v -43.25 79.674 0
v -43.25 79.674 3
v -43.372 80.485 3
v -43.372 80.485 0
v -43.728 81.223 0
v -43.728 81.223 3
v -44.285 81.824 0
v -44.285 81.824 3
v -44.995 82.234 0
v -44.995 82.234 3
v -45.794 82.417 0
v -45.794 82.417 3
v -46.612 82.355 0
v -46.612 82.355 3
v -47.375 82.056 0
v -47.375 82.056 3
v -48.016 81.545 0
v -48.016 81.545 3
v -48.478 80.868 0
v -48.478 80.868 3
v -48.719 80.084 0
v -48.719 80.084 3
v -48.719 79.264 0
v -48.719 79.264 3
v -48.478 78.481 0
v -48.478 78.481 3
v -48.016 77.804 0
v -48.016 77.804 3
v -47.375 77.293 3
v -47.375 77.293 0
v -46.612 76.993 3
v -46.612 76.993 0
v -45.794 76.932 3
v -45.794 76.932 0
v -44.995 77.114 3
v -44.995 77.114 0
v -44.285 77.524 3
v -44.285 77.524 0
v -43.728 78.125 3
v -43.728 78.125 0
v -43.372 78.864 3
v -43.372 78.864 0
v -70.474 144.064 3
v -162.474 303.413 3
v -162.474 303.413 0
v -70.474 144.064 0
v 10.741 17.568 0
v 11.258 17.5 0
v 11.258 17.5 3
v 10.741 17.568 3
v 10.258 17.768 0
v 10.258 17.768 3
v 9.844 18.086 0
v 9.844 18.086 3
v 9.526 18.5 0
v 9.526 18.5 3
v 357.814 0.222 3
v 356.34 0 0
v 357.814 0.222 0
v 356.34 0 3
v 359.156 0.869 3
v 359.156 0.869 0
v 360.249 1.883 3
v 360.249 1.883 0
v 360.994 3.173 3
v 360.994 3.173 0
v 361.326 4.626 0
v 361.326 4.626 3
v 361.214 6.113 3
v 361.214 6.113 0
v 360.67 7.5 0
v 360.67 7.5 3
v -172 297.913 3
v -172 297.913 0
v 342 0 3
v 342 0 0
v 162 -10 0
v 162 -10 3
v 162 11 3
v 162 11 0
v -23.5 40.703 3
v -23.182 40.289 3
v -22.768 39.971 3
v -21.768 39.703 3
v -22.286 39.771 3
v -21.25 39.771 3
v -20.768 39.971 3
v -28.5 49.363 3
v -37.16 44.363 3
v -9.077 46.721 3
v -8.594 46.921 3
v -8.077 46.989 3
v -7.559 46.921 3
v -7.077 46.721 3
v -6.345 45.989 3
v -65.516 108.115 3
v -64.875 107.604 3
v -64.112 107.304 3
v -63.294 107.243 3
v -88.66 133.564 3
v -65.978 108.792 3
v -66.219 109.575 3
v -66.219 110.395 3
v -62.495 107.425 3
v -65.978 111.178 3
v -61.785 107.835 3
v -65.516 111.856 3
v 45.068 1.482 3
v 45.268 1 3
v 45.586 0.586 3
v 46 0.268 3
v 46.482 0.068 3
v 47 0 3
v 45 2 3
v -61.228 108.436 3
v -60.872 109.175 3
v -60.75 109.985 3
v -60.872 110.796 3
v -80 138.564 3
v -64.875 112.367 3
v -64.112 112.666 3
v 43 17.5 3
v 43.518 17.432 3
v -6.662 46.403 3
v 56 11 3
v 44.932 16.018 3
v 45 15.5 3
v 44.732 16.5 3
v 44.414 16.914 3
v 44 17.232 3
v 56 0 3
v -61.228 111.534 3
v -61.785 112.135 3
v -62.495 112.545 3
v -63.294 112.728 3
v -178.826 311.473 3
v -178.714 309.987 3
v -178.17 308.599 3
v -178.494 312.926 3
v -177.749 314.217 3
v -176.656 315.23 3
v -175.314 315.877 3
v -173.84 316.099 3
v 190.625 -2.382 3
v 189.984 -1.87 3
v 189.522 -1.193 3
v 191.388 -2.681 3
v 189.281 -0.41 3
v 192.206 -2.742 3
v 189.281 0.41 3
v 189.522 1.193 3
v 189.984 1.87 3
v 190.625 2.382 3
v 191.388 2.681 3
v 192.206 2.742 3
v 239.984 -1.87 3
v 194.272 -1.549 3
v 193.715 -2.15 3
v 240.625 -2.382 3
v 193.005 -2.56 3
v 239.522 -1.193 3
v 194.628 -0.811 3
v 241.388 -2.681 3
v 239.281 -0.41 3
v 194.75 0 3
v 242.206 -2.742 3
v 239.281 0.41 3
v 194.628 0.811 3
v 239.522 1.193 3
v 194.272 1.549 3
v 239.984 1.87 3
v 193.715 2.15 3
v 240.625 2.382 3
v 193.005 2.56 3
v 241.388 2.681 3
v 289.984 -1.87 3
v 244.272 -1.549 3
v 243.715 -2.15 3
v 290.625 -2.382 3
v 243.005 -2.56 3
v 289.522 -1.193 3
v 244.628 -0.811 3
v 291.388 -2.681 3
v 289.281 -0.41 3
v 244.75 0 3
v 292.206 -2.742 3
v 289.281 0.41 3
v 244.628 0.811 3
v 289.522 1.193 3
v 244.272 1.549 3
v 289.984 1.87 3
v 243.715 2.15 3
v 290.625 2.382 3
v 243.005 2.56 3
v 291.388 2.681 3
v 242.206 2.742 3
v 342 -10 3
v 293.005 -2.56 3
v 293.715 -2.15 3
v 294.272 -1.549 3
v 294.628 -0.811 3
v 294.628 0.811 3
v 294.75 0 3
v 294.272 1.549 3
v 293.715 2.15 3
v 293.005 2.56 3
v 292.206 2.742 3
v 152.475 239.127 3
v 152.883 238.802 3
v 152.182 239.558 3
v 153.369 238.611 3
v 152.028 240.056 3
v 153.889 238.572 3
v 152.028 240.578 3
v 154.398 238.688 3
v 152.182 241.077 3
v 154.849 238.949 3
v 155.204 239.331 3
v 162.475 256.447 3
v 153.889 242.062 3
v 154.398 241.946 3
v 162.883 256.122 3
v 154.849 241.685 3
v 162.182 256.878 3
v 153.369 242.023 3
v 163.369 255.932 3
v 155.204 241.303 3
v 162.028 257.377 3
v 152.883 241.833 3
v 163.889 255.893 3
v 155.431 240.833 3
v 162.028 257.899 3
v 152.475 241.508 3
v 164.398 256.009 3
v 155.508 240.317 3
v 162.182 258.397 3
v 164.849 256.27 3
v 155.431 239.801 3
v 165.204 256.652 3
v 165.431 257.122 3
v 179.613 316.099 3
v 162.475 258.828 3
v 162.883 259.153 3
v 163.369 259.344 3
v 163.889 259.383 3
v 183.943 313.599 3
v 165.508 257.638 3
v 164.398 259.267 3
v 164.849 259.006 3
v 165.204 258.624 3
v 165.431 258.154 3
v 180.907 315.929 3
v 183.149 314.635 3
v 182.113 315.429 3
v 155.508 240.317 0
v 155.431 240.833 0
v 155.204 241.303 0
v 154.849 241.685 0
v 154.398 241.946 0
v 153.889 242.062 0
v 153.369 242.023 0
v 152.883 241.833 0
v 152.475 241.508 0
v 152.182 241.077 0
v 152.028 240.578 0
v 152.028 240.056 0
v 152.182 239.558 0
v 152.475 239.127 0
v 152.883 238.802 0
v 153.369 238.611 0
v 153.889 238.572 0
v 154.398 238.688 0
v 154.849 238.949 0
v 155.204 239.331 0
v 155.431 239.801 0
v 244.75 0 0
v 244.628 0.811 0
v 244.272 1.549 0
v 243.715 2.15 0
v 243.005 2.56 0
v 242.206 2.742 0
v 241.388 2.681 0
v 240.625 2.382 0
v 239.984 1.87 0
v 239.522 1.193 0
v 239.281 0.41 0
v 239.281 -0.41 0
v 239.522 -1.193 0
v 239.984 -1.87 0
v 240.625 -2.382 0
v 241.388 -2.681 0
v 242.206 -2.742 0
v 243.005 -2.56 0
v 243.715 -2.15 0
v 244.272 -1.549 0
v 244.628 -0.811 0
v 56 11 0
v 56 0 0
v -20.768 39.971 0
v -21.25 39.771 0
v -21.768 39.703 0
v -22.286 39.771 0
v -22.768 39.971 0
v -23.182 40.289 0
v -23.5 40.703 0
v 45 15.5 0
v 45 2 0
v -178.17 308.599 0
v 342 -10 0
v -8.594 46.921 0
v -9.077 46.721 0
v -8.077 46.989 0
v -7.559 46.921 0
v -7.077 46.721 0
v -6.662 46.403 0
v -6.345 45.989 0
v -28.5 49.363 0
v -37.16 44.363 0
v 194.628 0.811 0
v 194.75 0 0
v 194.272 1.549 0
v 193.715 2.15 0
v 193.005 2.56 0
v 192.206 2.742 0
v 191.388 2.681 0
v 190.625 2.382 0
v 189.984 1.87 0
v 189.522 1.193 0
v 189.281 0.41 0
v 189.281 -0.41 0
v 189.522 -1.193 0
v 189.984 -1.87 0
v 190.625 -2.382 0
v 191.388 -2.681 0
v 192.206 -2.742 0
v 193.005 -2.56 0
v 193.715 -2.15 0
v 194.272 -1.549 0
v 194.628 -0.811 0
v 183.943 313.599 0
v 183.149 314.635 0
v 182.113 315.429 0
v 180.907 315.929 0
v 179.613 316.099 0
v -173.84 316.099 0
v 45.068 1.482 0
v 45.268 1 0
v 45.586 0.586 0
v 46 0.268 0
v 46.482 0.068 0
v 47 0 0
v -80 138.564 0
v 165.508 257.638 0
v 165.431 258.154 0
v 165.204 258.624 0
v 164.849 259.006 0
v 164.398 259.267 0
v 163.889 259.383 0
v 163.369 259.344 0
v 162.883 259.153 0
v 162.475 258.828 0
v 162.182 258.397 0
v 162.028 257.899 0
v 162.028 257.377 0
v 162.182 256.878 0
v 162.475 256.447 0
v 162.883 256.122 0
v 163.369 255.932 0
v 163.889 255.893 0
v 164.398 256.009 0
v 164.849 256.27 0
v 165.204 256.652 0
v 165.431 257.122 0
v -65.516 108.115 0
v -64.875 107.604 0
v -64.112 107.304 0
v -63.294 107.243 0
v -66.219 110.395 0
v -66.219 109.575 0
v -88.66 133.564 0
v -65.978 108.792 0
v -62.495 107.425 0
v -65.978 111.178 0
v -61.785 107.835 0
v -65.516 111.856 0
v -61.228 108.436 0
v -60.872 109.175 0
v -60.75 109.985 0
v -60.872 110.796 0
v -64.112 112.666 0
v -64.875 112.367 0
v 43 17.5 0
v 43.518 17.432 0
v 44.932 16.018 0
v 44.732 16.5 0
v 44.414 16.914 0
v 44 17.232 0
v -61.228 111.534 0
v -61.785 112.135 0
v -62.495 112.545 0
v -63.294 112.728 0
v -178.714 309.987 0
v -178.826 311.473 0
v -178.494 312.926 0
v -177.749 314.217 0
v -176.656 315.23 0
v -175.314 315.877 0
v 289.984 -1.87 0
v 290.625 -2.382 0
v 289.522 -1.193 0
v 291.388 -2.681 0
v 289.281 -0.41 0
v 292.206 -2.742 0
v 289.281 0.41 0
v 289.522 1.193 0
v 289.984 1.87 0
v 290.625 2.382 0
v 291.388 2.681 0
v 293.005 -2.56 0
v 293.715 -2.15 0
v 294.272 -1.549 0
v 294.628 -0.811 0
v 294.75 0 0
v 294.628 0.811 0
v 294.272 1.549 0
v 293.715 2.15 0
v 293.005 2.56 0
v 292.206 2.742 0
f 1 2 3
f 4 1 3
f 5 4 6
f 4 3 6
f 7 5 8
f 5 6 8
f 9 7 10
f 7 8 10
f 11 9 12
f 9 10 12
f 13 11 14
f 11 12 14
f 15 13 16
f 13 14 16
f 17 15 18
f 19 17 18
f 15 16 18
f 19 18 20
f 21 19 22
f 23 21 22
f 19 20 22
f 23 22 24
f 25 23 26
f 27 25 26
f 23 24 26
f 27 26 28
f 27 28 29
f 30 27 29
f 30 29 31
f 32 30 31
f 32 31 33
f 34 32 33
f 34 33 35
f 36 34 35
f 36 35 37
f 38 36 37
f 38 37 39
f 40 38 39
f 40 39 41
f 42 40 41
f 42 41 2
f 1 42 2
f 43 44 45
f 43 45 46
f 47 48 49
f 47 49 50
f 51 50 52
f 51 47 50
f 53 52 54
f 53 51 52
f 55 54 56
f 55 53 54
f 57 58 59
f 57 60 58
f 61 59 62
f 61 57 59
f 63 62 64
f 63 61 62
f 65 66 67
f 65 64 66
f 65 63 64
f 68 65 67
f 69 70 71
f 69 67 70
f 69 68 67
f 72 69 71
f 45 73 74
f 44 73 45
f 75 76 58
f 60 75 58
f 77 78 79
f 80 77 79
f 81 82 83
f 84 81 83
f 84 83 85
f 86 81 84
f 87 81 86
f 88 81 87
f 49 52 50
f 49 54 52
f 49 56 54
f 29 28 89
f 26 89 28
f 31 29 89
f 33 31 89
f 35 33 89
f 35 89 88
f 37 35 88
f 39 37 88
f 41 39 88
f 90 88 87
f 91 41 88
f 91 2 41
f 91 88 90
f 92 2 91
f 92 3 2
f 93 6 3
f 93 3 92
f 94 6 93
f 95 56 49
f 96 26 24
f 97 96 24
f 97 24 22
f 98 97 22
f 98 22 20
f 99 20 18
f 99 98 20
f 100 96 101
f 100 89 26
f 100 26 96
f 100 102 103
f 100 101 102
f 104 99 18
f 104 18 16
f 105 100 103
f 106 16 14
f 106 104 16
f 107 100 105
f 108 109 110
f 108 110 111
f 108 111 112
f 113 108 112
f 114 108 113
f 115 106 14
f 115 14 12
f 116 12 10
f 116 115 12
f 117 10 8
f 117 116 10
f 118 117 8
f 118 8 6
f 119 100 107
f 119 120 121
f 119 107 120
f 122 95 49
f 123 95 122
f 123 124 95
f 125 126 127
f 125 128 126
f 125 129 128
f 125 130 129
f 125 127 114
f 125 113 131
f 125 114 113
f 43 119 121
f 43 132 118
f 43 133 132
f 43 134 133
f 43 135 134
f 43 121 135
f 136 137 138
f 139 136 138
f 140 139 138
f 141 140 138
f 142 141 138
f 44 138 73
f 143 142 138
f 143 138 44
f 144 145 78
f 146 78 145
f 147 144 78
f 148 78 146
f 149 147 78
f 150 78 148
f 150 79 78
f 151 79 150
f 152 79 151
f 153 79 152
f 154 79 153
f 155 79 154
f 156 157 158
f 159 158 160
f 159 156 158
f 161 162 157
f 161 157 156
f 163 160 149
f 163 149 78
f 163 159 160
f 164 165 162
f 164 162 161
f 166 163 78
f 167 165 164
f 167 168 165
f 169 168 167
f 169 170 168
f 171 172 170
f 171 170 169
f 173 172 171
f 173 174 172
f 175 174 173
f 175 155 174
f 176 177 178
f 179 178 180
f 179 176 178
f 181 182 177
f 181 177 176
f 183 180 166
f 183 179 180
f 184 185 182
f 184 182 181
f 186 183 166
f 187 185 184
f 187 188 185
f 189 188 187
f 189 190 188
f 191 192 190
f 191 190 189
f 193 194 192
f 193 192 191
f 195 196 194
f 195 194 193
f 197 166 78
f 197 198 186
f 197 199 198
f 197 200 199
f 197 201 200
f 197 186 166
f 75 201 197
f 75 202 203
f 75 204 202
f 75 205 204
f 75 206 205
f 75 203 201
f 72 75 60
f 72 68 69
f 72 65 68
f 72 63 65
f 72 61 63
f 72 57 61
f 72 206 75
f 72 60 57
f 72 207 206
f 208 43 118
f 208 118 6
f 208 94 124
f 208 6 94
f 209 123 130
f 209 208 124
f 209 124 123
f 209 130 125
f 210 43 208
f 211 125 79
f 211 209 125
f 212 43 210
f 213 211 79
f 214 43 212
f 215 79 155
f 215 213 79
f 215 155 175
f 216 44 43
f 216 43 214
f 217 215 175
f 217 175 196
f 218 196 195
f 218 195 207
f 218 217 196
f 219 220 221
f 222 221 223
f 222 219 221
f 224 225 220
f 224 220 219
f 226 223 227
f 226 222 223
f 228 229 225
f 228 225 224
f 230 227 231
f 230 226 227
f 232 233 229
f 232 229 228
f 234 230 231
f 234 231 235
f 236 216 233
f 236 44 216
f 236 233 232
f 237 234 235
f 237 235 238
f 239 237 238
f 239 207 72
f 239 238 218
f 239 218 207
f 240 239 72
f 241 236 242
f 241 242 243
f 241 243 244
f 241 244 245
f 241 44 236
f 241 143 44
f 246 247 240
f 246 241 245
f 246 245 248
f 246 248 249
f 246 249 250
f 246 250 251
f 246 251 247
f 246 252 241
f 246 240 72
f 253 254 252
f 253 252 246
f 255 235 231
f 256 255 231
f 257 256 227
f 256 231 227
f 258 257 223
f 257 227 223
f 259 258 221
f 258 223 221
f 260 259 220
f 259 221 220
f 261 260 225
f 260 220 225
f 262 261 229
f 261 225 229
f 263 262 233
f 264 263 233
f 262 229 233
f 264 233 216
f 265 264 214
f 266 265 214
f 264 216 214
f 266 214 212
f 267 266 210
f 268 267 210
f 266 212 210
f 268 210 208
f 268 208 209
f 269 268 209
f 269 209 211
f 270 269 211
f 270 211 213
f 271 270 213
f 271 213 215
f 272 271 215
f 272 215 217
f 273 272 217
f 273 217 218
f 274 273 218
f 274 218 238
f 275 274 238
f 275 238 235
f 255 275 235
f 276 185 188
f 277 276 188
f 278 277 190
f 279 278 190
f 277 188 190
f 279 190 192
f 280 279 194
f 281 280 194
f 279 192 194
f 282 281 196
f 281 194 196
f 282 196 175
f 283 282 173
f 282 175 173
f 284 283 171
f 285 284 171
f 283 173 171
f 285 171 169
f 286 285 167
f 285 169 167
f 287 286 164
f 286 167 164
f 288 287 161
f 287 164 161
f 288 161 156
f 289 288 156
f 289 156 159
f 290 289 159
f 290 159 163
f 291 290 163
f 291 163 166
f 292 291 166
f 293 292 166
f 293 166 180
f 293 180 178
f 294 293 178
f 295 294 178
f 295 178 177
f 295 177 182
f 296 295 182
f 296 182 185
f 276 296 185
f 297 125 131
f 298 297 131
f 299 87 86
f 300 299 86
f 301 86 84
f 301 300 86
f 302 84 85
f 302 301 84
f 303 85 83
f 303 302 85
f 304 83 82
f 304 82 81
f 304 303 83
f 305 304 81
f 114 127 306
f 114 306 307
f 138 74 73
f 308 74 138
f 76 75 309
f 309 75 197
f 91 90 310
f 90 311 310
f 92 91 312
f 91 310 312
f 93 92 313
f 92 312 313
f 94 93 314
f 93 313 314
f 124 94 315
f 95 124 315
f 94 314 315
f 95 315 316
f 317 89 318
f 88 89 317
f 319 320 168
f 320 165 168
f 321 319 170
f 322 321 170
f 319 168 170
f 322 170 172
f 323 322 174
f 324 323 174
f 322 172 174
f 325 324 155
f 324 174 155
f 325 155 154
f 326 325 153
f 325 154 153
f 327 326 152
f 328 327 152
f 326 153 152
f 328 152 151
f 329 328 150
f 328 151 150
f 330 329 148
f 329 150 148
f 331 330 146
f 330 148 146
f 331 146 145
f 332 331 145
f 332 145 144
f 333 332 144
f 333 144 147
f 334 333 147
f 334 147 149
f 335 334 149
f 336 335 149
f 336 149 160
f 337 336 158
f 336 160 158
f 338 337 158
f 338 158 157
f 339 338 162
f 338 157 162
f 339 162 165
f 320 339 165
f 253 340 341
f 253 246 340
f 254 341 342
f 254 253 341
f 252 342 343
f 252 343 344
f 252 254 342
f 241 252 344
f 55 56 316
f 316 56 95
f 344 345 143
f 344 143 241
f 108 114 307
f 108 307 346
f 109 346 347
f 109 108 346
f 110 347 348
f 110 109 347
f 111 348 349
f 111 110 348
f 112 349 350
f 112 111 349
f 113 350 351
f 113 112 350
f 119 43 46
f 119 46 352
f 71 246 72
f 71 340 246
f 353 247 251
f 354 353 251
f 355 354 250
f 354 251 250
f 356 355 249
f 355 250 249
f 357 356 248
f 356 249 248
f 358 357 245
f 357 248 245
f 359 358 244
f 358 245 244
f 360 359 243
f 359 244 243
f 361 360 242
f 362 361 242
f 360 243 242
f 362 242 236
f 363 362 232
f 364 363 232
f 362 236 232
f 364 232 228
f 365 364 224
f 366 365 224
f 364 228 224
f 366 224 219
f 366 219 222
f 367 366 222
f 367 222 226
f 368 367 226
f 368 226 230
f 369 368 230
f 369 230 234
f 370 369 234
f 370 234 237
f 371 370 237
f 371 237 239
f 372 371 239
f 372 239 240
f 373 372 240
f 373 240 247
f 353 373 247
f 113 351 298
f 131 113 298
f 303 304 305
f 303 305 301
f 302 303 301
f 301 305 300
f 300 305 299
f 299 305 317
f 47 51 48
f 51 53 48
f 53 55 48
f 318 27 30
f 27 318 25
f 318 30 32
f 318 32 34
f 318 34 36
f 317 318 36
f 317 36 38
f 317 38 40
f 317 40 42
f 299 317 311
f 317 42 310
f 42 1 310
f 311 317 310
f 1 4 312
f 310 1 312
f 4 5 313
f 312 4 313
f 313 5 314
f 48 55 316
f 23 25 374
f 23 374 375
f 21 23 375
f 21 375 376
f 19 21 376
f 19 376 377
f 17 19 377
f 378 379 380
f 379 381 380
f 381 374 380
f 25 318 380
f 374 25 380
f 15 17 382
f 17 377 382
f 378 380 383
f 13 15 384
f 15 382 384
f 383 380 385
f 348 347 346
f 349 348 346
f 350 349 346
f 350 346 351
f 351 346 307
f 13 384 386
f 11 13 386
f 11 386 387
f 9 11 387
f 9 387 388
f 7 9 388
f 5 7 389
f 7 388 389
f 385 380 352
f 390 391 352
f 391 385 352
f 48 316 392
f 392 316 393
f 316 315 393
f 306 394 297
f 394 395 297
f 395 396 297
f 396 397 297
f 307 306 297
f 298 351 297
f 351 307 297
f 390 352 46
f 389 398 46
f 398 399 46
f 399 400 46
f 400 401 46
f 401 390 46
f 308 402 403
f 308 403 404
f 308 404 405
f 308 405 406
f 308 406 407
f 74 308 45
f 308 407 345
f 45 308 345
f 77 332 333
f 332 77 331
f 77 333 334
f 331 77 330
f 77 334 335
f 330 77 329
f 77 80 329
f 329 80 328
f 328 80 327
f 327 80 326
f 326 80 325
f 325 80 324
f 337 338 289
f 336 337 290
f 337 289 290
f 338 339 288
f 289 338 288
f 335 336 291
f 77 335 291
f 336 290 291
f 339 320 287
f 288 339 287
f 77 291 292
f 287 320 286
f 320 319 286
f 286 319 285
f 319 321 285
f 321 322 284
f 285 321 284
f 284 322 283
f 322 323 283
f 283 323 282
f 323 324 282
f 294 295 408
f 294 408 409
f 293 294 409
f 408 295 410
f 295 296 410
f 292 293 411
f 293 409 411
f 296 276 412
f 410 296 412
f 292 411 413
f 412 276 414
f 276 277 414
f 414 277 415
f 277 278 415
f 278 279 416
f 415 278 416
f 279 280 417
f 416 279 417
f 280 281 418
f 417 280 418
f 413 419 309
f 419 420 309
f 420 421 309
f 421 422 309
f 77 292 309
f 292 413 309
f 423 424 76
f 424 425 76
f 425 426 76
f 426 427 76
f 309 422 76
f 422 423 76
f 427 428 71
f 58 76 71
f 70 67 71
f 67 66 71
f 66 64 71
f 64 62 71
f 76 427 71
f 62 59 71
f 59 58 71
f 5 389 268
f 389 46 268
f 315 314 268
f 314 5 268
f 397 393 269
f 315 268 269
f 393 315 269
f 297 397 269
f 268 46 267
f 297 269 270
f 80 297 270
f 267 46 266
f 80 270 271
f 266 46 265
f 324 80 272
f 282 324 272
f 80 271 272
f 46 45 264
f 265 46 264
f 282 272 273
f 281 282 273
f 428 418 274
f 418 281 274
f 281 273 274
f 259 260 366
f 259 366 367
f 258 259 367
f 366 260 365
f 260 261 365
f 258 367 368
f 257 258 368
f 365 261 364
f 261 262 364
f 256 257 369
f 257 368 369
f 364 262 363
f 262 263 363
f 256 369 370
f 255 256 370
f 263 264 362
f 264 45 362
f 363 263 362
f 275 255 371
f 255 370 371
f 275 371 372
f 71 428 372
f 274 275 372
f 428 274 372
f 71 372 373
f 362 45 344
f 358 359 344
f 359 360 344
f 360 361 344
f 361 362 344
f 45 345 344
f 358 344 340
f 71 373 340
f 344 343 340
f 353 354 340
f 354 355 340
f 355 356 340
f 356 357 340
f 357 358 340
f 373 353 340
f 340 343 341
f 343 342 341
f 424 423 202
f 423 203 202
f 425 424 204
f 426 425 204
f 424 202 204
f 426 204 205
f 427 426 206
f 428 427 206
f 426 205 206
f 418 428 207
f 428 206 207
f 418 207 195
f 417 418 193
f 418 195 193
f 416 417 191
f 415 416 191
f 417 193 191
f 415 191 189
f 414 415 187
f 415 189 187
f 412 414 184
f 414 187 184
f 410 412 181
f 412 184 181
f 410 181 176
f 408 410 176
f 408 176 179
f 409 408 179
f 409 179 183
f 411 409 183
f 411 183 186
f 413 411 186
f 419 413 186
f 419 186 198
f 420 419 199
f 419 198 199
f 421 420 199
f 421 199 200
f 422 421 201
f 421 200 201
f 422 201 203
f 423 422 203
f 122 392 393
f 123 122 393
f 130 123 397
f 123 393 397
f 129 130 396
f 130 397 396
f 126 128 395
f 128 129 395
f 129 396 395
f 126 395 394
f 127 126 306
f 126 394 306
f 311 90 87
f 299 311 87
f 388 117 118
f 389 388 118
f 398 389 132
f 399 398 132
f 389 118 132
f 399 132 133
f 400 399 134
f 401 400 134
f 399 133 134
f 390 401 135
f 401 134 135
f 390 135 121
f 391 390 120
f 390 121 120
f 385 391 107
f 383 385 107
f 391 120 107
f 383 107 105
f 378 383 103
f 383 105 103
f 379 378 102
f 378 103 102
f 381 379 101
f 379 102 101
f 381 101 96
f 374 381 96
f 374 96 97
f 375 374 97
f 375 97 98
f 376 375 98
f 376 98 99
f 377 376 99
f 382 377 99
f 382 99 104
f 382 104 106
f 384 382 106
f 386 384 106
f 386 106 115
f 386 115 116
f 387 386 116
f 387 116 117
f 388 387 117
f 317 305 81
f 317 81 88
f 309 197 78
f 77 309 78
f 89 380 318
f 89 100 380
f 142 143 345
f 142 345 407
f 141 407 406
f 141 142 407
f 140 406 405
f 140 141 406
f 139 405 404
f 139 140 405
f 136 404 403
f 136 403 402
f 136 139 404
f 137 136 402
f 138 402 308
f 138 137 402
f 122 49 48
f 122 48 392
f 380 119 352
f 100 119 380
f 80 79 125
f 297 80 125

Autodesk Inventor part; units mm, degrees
ref_plane "YZ Plane" through (0, 0, 0) normal (1, 0, 0) x (0, 1, 0)
ref_plane "XZ Plane" through (0, 0, 0) normal (0, 1, 0) x (-1, 0, 0)
ref_plane "XY Plane" through (0, 0, 0) normal (0, 0, 1) x (1, 0, 0)
sketch "Sketch7" plane through (0, 0, 0) normal (0, 0, 1) x (1, 0, 0)
  line L0 (182.5, 316.099272) -> (365, 0)
  line L1 (365, 0) -> (182.5, -316.099272)
  line L2 (182.5, -316.099272) -> (-182.5, -316.099272)
  line L3 (-182.5, -316.099272) -> (-365, 0)
  line L4 (-365, 0) -> (-182.5, 316.099272)
  line L5 (-182.5, 316.099272) -> (182.5, 316.099272)
  line L6 (0, 0) -> (-182.5, 316.099272)
  line L7 (0, 0) -> (365, 0)
  line L8 (0, 0) -> (0, 100)
  line L9 (0, 0) -> (100, 0) construction
  dimension "d56" = 365
  dimension "d69" = 100
  dimension "d70" = 90
  dimension "d71" = 30
extrude "Extrusion6" add sketch "Sketch7" along normal blind 3 contours L0 L7 L6 L5
sketch "Sketch8" plane through (0, 0, 3) normal (0, 0, 1) x (1, 0, 0)
  line L0 (37.655445, -30.221143) -> (-7.344555, 47.721143)
  line L1 (-7.344555, 47.721143) -> (-37.655445, 30.221143)
  line L2 (-37.655445, 30.221143) -> (7.344555, -47.721143)
  line L3 (7.344555, -47.721143) -> (37.655445, -30.221143)
  line L4 (37.655445, -30.221143) -> (-37.655445, 30.221143) construction
  line L5 (-7.344555, 47.721143) -> (7.344555, -47.721143) construction
  line L6 (37.655445, -30.221143) -> (127.655445, -30.221143) construction
  line L7 (-45, 17.5) -> (45, 17.5)
  line L8 (45, 17.5) -> (45, -17.5)
  line L9 (45, -17.5) -> (-45, -17.5)
  line L10 (-45, -17.5) -> (-45, 17.5)
  line L11 (-182.5, 316.099272) -> (0, 0)
  line L12 (-45, 17.5) -> (45, -17.5) construction
  line L13 (45, 17.5) -> (-45, -17.5) construction
  line L14 (-45, 17.5) -> (45, 17.5) construction
  dimension "d60" = 90
  dimension "d61" = 120
  dimension "d62" = 35
  dimension "d63" = 90
  dimension "d64" = 0
  dimension "d65" = 35
extrude "Extrusion7" cut sketch "Sketch8" against normal blind 3
sketch "Sketch9" plane through (0, 0, 3) normal (0, 0, 1) x (1, 0, 0)
  line L0 (0, 0) -> (152.5, 264.137748)
  line L1 (0, 0) -> (305, 0) construction
  line L2 (152.5, 264.137748) -> (163.75833, 257.637748)
  line L3 (152.5, 264.137748) -> (165.5, 264.137748) construction
  circle A0 centre (163.75833, 257.637748) radius 1.75
  line L4 (163.75833, 257.637748) -> (153.75833, 240.31724)
  circle A1 centre (153.75833, 240.31724) radius 1.75
  dimension "d72" = 305
  dimension "d73" = 60
  dimension "d74" = 13
  dimension "d75" = 30
  dimension "d76" = 3.5
  dimension "d77" = 20
  dimension "d78" = 90
  dimension "d79" = 3.5
extrude "Extrusion8" cut sketch "Sketch9" against normal blind 3
fillet "Fillet1" radius 5 3 edges at (182.5, 316.0993, 1.5) (365, 0, 1.5) (-182.5, 316.0993, 1.5)
fillet "Fillet2" radius 2 2 edges at (45, 17.5, 1.5) (-7.3446, 47.7211, 1.5)
fillet "Fillet3" radius 2 2 edges at (45, 0, 1.5) (10.1036, 17.5, 1.5)
fillet "Fillet4" radius 2 1 edges at (-22.5, 38.9711, 1.5)
sketch "Sketch13" plane through (0, 0, 3) normal (0, 0, 1) x (1, 0, 0)
  line L0 (-178.169873, 308.599272) -> (-23.5, 40.703194)
  line L1 (-23.5, 40.703194) -> (-28.5, 49.363448)
  line L2 (-28.5, 49.363448) -> (-80, 138.564065)
  line L3 (-80, 138.564065) -> (-88.660254, 133.564065)
  line L4 (-88.660254, 133.564065) -> (-37.160254, 44.363448)
  line L5 (-37.160254, 44.363448) -> (-28.5, 49.363448)
  line L6 (-28.5, 49.363448) -> (74.5, 49.363448) construction
  line L7 (47, 0) -> (356.339746, 0)
  line L8 (47, 0) -> (162, 0)
  line L9 (162, 0) -> (342, 0)
  line L10 (342, 0) -> (342, -10)
  line L11 (342, -10) -> (162, -10)
  line L12 (162, -10) -> (162, 0)
  point P0 (0, 0)
  dimension "d123" = 10
  dimension "d124" = 103
  dimension "d125" = 120
  dimension "d126" = 10
  dimension "d127" = 115
  dimension "d128" = 180
  dimension "d129" = 10
extrude "Extrusion12" add sketch "Sketch13" against normal blind 3
sketch "Sketch14" plane through (0, 0, 3) normal (0, 0, 1) x (1, 0, 0)
  line L0 (-178.169873, 308.599272) -> (-80, 138.564065)
  line L1 (-80, 138.564065) -> (-80, 138.564065)
  line L2 (-80, 138.564065) -> (-172, 297.912739)
  line L3 (-172, 297.912739) -> (-162.473721, 303.412739)
  line L4 (-162.473721, 303.412739) -> (-70.473721, 144.064065)
  line L5 (-70.473721, 144.064065) -> (-80, 138.564065)
  line L6 (47, 0) -> (162, 0)
  line L7 (47, 0) -> (56, 0)
  line L8 (56, 0) -> (162, 0)
  line L9 (162, 0) -> (162, 11)
  line L10 (162, 11) -> (56, 11)
  line L11 (56, 11) -> (56, 0)
  point P0 (0, 0)
  dimension "d132" = 0
  dimension "d133" = 184
  dimension "d134" = 11
  dimension "d135" = 9
  dimension "d136" = 106
  dimension "d137" = 11
extrude "Extrusion13" cut sketch "Sketch14" against normal blind 3
sketch "Sketch15" plane through (0, 0, 3) normal (0, 0, 1) x (1, 0, 0)
  line L0 (342, 0) -> (342, -10)
  line L1 (342, 0) -> (292, 0)
  circle A0 centre (292, 0) radius 2.75
  circle A1 centre (242, 0) radius 2.75
  circle A2 centre (192, 0) radius 2.75
  line L2 (-28.5, 49.363448) -> (-37.160254, 44.363448)
  line L3 (-28.5, 49.363448) -> (-46, 79.674337)
  line L4 (-28.5, 49.363448) -> (6.5, 49.363448) construction
  circle A3 centre (-46, 79.674337) radius 2.75
  circle A4 centre (-63.5, 109.985226) radius 2.75
  point P0 (0, 0)
  dimension "d140" = 50
  dimension "d141" = 5.5
  dimension "d144" = 50
  dimension "d149" = 35
  dimension "d150" = 120
  dimension "d151" = 5.5
  dimension "d154" = 35
extrude "Extrusion14" cut sketch "Sketch15" against normal blind 3
sketch "Sketch16" plane through (0, 0, 0) normal (0, 0, -1) x (-1, 0, 0)
  line L0 (181.006538, 319.907407) -> (181.006538, -10.092593)
  line L1 (181.006538, -10.092593) -> (-363.993462, -10.092593)
  line L2 (-363.993462, -10.092593) -> (-363.993462, 319.907407)
  line L3 (-363.993462, 319.907407) -> (181.006538, 319.907407)
  line L4 (-342, -10) -> (-162, -10)
  point P0 (0, 0)
  dimension "d161" = 545
  dimension "d162" = 330
properties part number "Acrylic_top"
